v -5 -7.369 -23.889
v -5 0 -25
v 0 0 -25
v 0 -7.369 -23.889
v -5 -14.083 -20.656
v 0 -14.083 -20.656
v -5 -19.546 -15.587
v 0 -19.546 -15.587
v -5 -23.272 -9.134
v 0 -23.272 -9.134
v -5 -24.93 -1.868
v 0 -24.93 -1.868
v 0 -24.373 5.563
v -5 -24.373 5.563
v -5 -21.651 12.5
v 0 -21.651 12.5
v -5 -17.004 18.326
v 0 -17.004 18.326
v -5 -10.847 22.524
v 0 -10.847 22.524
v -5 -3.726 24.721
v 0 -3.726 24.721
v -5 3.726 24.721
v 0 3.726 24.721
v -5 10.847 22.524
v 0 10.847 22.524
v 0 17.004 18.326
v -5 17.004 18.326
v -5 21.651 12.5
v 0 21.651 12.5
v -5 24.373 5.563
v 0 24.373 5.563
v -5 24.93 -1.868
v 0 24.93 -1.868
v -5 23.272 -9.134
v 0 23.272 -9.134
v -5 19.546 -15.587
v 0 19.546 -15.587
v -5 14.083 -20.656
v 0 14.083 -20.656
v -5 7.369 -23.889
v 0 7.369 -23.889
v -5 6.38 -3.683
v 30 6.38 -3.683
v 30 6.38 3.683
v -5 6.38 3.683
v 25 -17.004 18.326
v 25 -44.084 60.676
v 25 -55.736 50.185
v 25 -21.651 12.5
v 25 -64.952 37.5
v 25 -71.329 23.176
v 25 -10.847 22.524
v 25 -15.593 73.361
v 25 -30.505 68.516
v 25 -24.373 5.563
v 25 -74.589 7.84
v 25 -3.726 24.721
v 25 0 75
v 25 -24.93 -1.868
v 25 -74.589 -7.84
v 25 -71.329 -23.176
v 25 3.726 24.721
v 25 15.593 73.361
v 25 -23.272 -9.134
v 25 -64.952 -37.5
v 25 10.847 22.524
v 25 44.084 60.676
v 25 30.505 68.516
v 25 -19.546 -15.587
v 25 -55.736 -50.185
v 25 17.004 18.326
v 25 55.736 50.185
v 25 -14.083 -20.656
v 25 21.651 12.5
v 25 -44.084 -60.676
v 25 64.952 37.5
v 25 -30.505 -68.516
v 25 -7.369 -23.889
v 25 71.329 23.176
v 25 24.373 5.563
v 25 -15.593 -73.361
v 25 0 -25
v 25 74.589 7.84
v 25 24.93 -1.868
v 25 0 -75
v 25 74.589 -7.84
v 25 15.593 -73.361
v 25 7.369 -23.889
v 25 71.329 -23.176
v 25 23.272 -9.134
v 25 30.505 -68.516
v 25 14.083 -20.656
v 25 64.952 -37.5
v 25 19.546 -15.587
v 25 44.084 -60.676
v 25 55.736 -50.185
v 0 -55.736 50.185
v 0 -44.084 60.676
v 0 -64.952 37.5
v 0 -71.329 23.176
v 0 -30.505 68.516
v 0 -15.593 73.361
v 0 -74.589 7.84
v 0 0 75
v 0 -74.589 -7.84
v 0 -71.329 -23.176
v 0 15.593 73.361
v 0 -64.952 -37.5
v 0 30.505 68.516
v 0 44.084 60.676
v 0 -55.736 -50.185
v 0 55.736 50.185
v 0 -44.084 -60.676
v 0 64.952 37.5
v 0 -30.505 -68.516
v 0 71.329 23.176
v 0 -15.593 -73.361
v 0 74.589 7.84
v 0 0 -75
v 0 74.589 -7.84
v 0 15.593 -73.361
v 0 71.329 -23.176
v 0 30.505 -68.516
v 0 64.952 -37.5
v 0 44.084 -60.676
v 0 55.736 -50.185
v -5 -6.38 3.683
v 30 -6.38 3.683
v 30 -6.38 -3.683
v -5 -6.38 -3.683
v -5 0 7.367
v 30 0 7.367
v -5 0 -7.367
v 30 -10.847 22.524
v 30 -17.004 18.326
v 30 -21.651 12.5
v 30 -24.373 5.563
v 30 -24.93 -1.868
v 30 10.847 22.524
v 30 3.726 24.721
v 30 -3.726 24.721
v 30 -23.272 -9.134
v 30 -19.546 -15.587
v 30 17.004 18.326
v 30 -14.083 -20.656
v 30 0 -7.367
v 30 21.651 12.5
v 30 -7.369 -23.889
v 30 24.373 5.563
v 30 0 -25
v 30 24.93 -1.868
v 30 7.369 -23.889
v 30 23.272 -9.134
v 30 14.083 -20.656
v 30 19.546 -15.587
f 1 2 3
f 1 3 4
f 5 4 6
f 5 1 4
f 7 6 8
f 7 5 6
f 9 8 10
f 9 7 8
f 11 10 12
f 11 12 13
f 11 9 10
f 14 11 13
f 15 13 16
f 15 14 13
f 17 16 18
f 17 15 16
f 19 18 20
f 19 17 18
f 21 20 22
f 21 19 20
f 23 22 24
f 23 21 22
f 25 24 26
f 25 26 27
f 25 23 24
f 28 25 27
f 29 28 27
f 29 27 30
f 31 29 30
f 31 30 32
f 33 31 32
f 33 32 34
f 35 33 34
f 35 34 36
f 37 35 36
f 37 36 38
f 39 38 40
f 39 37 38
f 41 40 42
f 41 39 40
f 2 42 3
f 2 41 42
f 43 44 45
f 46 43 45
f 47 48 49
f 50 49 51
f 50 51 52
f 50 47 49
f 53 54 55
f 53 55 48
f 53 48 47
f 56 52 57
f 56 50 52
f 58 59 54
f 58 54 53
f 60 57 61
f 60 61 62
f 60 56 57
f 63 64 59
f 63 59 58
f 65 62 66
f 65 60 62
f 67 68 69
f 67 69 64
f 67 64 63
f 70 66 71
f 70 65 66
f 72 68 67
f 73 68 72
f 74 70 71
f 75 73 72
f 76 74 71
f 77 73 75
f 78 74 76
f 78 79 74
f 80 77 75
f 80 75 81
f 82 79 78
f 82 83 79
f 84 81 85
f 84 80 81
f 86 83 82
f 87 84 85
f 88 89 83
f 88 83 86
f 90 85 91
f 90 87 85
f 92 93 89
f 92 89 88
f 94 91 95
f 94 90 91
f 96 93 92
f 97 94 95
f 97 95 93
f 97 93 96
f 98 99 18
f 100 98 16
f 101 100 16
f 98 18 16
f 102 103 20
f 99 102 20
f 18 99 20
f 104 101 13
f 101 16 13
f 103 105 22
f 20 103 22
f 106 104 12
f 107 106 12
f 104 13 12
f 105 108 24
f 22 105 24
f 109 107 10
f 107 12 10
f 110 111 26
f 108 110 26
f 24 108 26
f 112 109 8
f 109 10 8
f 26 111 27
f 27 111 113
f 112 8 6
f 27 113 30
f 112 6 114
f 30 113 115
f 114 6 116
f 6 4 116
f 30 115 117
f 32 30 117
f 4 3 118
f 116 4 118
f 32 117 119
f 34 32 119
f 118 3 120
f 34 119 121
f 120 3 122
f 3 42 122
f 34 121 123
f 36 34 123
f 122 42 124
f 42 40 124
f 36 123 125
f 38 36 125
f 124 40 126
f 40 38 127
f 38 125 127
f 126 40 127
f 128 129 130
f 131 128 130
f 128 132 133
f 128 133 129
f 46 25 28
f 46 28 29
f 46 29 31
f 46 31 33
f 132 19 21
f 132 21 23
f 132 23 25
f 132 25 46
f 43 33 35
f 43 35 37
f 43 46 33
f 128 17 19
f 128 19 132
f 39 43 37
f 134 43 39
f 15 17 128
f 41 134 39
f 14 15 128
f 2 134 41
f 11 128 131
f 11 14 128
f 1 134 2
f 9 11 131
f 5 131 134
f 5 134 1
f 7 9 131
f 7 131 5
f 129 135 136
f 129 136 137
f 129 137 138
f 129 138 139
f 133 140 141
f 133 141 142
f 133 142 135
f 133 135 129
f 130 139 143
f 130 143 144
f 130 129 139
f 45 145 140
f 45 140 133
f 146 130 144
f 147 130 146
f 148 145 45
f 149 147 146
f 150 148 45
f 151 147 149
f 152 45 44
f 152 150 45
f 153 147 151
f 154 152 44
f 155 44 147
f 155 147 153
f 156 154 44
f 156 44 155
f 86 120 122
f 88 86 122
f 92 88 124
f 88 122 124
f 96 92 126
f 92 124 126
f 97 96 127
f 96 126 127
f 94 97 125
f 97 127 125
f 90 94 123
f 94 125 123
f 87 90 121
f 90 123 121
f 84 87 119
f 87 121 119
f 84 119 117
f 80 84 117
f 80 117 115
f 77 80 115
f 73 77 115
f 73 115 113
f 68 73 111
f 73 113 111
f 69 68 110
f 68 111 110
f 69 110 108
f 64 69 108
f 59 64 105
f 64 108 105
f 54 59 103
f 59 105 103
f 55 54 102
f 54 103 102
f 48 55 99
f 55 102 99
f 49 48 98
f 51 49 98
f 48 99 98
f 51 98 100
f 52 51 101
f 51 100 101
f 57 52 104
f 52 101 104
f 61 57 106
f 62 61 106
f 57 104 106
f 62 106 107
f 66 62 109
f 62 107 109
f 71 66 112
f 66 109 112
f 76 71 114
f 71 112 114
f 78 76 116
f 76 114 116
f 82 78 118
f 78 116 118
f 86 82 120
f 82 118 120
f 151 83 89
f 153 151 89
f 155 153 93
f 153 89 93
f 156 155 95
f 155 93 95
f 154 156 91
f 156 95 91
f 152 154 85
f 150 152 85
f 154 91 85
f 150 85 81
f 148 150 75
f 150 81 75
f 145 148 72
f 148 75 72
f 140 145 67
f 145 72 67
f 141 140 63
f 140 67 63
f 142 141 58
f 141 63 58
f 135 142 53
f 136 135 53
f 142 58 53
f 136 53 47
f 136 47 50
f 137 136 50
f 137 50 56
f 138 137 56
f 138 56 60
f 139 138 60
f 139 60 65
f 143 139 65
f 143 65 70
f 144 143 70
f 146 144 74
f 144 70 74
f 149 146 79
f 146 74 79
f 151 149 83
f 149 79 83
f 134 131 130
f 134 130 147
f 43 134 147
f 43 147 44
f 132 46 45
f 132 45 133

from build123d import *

# Parameters (mm, degrees)
SKETCH_3_R          = 75
EXTRUDE_1_DEPTH     = 25
SKETCH_4_R          = 25
EXTRUDE_3_DEPTH     = 5
EXTRUDE_START       = 5
SKETCH_6_R          = 25
EXTRUDE_4_DEPTH     = 5
CUT_EXTRUDE_3_DEPTH = 40


with BuildPart() as part:
    # 草图3 → 凸台-拉伸1 (new body)
    with BuildSketch(Plane(origin=(0, 0, 0), x_dir=(0, 0, -1), z_dir=(1, 0, 0))):
        Circle(SKETCH_3_R)
    extrude(amount=EXTRUDE_1_DEPTH)

    # 草图4 → 凸台-拉伸3 (add)
    with BuildSketch(Plane(origin=(25, 0, 0), x_dir=(0, 0, -1), z_dir=(1, 0, 0))):
        Circle(SKETCH_4_R)
    extrude(amount=EXTRUDE_3_DEPTH)

    # 草图6 → 凸台-拉伸4 (add)
    with BuildSketch(Plane.ZY.offset(EXTRUDE_START)):
        with Locations(Location((0, 0, 0), (0, 0, 180))):
            Circle(SKETCH_6_R)
    extrude(amount=-EXTRUDE_4_DEPTH)

    # 草图7 → 切除-拉伸3 (cut)
    with BuildSketch(Plane(origin=(30, 0, 0), x_dir=(0, 0, -1), z_dir=(1, 0, 0))):
        Polygon((7.366989435, 0), (3.683494717, 6.38), (-3.683494717, 6.38), (-7.366989435, 0), (-3.683494717, -6.38), (3.683494717, -6.38), align=None)
    extrude(amount=-CUT_EXTRUDE_3_DEPTH, mode=Mode.SUBTRACT)


solid = part.part
